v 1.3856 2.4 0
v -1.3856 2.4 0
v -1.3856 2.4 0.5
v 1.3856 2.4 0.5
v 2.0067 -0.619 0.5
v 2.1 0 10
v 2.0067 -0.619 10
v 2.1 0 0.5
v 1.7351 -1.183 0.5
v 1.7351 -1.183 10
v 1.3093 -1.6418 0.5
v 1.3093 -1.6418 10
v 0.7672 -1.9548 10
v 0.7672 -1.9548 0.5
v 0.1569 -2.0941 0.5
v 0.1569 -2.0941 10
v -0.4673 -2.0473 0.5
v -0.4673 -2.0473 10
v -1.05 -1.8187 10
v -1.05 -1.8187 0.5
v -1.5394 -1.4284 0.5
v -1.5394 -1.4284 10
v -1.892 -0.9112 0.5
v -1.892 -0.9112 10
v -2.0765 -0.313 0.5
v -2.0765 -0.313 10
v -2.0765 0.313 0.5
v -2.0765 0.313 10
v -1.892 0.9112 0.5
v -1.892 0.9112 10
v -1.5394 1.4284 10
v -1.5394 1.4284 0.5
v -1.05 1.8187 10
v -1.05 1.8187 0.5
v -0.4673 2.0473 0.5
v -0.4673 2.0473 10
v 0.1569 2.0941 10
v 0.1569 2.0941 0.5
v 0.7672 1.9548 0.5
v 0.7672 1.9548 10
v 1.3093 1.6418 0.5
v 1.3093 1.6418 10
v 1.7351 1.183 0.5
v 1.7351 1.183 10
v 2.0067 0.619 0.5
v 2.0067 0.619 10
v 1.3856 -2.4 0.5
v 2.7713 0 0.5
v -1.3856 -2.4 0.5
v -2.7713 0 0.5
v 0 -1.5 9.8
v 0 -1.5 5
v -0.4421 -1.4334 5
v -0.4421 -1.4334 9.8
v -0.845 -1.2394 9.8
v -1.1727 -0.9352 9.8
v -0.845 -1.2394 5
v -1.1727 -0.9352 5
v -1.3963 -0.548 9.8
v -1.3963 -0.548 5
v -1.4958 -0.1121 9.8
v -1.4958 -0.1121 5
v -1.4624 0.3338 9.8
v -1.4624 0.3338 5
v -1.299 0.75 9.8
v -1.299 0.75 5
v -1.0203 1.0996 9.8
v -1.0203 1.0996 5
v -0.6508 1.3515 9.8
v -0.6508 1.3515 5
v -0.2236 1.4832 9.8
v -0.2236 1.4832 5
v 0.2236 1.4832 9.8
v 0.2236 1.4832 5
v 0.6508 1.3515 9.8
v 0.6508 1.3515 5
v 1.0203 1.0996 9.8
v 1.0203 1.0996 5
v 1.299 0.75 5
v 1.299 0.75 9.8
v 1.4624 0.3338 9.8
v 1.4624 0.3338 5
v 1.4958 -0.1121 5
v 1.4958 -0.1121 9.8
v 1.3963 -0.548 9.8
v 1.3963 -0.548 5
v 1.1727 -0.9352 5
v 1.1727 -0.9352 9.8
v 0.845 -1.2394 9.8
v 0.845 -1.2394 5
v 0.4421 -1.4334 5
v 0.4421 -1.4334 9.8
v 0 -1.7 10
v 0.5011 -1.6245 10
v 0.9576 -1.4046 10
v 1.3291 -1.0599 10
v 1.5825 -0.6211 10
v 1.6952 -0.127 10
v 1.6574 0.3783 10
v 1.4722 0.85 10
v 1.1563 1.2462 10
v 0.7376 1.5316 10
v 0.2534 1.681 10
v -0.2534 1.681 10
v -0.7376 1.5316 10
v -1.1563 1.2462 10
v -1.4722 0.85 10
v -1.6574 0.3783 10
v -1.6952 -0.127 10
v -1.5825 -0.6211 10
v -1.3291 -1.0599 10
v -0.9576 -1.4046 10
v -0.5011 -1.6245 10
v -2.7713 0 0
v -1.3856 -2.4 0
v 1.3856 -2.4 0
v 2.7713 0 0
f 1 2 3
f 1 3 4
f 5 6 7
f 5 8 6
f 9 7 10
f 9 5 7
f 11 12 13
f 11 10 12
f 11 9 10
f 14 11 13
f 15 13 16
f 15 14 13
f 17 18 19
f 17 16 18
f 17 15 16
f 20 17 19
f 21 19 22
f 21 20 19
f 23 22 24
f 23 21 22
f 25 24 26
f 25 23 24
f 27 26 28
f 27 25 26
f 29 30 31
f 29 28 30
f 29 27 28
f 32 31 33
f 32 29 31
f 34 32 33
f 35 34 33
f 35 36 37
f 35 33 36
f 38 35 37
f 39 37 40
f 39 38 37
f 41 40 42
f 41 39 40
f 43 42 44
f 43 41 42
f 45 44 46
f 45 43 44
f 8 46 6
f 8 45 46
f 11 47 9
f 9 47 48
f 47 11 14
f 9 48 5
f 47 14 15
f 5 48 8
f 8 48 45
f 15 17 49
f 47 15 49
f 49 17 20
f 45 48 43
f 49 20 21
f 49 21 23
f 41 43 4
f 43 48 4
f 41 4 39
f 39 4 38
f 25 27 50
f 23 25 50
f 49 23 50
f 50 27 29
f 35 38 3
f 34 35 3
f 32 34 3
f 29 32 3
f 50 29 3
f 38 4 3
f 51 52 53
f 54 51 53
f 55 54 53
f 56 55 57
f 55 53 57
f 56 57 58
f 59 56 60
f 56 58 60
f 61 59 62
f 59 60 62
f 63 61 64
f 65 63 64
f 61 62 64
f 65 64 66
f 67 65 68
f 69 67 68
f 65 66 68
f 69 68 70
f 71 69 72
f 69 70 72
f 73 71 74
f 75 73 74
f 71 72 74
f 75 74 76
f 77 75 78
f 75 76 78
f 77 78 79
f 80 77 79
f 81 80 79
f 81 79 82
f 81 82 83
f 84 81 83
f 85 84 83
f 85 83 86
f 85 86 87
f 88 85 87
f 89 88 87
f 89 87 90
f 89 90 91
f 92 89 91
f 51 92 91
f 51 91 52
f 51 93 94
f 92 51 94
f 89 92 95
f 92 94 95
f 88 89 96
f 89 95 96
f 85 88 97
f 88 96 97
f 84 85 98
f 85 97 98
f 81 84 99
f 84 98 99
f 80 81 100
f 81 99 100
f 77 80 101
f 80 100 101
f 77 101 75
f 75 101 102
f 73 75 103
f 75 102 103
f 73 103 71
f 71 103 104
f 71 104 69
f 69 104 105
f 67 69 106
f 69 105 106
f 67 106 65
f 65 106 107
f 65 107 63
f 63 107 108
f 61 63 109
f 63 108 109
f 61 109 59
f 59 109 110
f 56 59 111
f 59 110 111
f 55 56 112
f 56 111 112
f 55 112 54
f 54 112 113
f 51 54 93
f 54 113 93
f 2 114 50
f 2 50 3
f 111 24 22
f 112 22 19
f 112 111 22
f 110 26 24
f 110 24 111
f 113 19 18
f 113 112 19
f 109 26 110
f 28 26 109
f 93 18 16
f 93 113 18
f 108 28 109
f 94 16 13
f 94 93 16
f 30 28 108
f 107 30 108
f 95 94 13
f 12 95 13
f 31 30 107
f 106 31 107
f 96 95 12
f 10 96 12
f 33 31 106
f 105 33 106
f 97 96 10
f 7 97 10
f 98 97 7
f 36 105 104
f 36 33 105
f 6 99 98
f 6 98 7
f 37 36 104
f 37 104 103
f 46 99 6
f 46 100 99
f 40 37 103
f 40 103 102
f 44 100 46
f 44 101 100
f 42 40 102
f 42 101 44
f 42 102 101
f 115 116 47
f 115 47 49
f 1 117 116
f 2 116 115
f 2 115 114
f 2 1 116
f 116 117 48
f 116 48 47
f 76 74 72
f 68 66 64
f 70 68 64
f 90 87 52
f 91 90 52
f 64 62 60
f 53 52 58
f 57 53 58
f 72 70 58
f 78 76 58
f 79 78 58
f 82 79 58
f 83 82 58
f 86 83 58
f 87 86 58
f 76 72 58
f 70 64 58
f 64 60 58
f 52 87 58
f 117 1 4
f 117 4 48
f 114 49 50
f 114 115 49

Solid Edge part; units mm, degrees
sketch "Sketch1" plane through (0, 0, 0) normal (0, 0, 1) x (1, 0, 0)
  line L0 (-1.3856, 2.4) -> (1.3856, 2.4)
  line L1 (1.3856, 2.4) -> (2.7713, 0)
  line L2 (2.7713, 0) -> (1.3856, -2.4)
  line L3 (1.3856, -2.4) -> (-1.3856, -2.4)
  line L4 (-1.3856, -2.4) -> (-2.7713, 0)
  line L5 (-2.7713, 0) -> (-1.3856, 2.4)
  dimension "D1" = 4.8
extrude "Protrusion1" add sketch "Sketch1" along normal blind 0.5
sketch "Sketch2" plane through (0, 0, 0.5) normal (0, 0, 1) x (1, 0, 0)
  circle A0 centre (0, 0) radius 2.1
  dimension "D1" = 4.2
extrude "Ausprägung_2" add sketch "Sketch2" along normal blind 9.5
hole "Bohrung_1" at (0, 0, 10) direction (0, 0, -1) diameter 3 depth 5
chamfer "Fase_1" distance 0.2 angle 45 1 edges at (0, 1.5, 10)
